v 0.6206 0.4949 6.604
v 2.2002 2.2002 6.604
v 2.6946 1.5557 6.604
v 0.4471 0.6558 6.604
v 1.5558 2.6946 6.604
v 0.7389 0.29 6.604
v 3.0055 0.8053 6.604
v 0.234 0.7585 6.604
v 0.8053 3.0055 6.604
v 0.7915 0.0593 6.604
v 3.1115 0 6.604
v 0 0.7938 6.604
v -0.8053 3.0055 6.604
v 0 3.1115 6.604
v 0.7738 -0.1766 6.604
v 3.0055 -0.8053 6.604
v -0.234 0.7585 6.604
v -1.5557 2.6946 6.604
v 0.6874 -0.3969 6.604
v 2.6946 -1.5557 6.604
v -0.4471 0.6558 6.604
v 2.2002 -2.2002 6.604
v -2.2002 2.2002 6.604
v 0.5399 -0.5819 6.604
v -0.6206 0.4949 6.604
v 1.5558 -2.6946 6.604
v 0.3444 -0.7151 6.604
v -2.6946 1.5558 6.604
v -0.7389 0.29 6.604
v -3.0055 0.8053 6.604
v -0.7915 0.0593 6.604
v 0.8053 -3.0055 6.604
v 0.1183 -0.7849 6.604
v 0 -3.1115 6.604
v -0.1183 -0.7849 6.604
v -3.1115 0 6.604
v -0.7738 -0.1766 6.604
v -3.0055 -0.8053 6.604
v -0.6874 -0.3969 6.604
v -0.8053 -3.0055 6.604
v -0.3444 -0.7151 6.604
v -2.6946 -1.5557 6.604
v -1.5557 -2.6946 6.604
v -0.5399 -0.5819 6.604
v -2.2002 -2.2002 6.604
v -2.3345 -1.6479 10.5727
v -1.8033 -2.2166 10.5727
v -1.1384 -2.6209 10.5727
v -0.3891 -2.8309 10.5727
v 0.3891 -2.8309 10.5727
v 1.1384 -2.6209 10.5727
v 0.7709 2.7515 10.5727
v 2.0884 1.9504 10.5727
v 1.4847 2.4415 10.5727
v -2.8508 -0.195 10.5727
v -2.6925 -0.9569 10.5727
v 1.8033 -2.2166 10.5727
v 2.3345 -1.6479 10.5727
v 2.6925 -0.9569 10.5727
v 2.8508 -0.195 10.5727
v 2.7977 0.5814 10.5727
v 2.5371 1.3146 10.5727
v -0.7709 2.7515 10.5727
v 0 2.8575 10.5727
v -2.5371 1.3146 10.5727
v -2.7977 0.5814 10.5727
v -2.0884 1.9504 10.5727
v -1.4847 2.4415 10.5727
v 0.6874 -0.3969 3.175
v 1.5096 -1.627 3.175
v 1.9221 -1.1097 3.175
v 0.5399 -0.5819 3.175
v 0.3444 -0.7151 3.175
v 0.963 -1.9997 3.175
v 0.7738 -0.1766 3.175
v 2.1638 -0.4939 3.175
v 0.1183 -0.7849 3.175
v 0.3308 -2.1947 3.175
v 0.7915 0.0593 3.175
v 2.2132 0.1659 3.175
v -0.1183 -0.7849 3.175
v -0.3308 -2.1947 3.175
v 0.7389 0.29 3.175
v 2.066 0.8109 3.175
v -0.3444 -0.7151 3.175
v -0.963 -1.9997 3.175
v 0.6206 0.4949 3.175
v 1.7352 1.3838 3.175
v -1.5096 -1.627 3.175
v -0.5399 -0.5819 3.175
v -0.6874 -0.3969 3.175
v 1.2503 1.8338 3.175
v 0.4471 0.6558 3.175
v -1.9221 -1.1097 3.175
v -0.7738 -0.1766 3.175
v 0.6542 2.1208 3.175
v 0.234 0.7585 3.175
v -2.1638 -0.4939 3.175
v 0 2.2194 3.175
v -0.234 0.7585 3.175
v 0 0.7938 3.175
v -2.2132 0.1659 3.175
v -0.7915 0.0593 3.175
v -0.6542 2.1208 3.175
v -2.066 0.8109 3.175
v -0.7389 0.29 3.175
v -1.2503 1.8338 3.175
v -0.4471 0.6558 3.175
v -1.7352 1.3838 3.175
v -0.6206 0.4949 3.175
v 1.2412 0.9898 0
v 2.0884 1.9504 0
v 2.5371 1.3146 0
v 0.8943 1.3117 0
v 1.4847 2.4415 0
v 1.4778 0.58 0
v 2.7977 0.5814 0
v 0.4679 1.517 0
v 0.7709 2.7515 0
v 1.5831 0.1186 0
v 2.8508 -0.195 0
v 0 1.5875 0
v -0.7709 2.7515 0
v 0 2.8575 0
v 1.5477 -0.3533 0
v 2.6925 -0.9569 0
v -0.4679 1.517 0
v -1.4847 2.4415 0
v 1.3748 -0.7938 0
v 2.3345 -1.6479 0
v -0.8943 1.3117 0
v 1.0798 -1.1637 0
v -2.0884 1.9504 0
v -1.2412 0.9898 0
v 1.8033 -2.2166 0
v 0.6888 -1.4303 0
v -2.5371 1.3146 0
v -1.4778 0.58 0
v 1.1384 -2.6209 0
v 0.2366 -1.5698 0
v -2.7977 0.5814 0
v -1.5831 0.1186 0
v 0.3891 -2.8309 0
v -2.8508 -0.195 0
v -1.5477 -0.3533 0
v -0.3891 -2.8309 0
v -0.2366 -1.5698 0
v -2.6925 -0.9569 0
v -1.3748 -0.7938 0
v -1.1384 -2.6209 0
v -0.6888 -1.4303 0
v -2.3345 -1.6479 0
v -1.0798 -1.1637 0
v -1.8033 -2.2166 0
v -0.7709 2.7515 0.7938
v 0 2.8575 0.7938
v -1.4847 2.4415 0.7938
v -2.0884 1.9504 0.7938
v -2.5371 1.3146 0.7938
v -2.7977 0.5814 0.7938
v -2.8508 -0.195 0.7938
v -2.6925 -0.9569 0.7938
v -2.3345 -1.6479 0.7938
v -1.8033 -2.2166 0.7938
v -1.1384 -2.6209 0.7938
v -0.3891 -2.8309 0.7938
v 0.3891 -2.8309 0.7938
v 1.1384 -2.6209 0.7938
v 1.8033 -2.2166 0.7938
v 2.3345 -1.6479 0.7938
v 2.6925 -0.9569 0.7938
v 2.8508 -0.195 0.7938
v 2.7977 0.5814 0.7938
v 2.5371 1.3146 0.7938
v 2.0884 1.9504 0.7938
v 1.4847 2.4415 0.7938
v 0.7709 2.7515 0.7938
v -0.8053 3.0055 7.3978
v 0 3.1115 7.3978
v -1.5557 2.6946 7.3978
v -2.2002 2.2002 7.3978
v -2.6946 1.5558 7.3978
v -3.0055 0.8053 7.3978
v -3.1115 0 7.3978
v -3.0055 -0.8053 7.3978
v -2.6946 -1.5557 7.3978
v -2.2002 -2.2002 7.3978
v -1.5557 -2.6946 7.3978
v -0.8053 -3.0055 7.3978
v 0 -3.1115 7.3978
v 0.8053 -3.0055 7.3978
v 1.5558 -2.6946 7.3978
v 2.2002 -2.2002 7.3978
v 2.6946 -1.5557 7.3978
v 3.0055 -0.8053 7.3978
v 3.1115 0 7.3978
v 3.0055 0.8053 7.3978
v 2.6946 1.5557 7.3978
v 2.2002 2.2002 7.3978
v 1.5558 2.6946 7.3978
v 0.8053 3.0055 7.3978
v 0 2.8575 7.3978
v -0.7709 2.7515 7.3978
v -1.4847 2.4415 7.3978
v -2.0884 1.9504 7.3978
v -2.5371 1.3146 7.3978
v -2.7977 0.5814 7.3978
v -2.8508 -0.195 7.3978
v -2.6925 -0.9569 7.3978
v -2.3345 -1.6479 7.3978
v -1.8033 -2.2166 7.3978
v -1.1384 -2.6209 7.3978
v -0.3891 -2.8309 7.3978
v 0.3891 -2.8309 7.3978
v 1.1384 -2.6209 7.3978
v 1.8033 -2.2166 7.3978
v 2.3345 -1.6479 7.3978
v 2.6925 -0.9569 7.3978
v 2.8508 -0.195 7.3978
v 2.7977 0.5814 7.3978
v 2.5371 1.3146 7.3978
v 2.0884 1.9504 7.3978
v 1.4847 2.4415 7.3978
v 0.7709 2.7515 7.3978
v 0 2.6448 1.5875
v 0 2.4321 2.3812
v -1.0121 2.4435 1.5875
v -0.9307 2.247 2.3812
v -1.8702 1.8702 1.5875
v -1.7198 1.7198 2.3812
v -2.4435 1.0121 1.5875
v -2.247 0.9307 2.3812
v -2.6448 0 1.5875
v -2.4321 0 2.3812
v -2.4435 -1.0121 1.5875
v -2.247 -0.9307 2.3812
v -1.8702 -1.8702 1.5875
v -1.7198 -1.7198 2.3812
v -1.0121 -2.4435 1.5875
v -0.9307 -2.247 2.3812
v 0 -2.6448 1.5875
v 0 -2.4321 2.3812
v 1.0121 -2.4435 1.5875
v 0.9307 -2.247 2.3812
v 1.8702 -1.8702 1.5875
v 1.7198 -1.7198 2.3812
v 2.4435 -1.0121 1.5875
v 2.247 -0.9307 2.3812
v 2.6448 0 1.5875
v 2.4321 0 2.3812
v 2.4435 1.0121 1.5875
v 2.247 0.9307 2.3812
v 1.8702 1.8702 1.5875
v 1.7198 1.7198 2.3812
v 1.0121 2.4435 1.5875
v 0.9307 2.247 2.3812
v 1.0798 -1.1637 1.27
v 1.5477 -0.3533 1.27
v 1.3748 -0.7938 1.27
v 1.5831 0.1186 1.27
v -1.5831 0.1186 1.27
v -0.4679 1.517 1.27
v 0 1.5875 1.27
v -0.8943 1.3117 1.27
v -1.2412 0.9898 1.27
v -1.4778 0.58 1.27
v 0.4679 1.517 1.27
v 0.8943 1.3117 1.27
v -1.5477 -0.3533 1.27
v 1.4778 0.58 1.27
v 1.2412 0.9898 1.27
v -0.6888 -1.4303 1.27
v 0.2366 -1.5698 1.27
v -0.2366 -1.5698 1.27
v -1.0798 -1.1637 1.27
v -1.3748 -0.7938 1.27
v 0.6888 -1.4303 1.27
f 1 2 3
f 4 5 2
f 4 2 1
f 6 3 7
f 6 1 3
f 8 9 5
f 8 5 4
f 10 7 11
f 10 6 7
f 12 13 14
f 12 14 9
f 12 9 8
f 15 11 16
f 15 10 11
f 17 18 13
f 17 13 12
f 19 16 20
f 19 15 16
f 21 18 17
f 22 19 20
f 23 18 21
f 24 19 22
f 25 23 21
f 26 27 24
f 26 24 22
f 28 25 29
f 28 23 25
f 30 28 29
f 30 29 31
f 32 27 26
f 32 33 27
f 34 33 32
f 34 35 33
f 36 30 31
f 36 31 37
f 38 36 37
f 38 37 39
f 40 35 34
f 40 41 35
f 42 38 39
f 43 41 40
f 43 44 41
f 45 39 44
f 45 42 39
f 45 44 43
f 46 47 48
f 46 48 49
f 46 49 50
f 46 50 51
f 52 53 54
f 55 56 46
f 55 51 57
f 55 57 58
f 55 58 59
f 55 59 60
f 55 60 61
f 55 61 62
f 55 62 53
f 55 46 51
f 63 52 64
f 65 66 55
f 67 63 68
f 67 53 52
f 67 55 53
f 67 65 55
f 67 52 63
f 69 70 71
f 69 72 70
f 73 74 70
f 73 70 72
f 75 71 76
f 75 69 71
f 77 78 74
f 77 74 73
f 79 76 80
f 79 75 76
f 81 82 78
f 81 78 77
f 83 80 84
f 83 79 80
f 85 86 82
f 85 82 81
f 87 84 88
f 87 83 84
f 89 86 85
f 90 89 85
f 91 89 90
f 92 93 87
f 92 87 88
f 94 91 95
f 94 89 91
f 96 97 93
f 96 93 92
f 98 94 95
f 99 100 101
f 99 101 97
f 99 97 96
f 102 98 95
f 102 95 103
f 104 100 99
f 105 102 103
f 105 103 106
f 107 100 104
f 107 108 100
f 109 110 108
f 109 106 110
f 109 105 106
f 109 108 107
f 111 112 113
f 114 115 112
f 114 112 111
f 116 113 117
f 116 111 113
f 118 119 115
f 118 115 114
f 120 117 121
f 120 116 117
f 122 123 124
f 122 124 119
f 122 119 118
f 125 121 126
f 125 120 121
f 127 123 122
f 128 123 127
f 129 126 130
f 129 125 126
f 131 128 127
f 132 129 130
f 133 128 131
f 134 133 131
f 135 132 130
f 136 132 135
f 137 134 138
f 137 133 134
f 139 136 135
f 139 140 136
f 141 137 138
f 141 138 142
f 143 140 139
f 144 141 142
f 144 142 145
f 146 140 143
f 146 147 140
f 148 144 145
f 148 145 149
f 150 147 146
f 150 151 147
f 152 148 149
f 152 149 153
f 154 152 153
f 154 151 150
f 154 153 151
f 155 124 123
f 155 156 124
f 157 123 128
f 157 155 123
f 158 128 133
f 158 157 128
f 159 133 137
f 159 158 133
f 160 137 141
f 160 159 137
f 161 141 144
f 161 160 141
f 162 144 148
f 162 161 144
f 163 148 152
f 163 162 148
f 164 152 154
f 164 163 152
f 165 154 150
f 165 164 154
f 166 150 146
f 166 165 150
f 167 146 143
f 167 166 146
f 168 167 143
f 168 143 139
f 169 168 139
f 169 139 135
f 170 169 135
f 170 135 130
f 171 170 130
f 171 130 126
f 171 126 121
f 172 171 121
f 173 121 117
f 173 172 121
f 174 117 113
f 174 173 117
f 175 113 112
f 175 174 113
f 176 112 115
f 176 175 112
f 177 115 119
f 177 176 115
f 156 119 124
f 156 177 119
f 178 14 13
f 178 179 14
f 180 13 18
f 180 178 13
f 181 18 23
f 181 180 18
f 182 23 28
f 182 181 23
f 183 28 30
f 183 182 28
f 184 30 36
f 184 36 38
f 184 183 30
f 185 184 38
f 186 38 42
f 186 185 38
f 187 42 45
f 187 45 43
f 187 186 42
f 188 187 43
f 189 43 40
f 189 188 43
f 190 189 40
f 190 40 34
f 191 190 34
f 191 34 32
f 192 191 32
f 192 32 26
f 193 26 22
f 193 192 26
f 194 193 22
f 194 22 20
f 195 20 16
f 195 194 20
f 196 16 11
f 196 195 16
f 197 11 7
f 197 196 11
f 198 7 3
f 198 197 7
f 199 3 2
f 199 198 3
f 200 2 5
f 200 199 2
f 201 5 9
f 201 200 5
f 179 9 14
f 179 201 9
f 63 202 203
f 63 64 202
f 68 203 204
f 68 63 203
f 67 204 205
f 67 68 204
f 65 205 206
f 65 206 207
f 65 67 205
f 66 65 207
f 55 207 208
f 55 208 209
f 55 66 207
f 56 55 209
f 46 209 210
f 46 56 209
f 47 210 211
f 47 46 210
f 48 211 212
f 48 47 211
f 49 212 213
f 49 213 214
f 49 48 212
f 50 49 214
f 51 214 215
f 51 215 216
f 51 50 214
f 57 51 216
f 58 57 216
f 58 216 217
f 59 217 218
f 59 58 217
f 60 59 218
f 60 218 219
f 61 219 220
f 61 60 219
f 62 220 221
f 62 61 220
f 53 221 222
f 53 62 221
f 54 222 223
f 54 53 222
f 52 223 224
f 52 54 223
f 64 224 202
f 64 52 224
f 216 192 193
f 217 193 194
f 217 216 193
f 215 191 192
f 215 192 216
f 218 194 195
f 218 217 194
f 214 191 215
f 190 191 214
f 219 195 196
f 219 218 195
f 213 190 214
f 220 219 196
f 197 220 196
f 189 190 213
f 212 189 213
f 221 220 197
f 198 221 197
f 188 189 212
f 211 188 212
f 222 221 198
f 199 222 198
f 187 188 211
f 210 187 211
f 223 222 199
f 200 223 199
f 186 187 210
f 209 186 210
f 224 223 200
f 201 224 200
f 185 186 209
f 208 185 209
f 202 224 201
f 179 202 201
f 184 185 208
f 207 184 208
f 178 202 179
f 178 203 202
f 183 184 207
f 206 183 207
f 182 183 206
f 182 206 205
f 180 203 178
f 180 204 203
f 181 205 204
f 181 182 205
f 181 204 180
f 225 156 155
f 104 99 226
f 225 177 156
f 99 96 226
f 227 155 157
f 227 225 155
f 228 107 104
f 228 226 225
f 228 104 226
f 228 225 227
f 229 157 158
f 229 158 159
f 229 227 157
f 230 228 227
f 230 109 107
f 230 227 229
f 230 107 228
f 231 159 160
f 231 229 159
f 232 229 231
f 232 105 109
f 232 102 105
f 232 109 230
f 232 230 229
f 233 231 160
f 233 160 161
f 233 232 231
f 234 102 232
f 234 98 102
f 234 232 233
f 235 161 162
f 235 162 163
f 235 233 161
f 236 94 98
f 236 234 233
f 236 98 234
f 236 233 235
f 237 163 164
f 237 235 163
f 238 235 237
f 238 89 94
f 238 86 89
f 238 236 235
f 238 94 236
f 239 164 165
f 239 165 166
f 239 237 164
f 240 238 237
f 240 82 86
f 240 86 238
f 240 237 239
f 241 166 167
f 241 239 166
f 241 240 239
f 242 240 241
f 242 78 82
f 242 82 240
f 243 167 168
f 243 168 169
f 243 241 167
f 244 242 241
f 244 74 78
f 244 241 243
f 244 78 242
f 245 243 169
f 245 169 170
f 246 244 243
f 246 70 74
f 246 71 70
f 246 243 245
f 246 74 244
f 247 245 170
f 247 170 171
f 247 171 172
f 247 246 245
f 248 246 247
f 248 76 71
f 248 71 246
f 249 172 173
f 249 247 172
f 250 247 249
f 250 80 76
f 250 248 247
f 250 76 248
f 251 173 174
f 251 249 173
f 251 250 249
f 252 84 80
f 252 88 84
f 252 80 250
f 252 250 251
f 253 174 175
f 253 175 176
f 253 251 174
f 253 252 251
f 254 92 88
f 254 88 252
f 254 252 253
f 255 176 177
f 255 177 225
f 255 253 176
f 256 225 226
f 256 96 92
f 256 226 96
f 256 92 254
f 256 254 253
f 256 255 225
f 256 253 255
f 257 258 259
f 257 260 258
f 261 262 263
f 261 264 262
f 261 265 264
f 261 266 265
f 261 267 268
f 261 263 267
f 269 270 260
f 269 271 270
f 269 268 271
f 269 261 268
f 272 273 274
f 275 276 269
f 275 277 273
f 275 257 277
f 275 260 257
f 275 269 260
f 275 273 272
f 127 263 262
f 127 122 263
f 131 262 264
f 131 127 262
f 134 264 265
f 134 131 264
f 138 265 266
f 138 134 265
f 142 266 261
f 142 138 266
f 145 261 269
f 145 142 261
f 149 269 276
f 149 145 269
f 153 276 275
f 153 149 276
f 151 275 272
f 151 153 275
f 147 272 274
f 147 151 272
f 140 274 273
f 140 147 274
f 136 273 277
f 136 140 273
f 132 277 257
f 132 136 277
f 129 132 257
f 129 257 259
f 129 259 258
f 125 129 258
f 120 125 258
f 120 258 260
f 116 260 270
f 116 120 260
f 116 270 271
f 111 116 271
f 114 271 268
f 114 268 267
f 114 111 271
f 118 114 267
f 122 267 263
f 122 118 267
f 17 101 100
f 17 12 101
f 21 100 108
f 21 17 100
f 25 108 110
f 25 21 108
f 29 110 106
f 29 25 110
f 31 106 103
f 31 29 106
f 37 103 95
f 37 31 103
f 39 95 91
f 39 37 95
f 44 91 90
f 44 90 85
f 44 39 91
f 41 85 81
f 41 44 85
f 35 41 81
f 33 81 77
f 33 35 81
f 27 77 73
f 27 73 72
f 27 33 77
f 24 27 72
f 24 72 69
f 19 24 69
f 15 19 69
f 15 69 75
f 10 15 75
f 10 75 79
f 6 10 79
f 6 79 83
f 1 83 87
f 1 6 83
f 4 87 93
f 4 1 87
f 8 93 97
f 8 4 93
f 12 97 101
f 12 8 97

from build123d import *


with BuildPart() as f1:
    # F0 (on Right) → F1 (revolve)
    with BuildSketch(Plane.YZ):
        Polygon((0, 10.57275), (0, 1.27), (1.5875, 1.27), (1.5875, 0), (2.8575, 0), (2.8575, 0.79375), (2.219446, 3.175), (0.79375, 3.175), (0.79375, 6.604), (3.1115, 6.604), (3.1115, 7.39775), (2.8575, 7.39775), (2.8575, 10.57275), align=None)
    revolve(axis=Axis((0, 0, 5.286375), (0, 0, 1)))


solid = f1.part
